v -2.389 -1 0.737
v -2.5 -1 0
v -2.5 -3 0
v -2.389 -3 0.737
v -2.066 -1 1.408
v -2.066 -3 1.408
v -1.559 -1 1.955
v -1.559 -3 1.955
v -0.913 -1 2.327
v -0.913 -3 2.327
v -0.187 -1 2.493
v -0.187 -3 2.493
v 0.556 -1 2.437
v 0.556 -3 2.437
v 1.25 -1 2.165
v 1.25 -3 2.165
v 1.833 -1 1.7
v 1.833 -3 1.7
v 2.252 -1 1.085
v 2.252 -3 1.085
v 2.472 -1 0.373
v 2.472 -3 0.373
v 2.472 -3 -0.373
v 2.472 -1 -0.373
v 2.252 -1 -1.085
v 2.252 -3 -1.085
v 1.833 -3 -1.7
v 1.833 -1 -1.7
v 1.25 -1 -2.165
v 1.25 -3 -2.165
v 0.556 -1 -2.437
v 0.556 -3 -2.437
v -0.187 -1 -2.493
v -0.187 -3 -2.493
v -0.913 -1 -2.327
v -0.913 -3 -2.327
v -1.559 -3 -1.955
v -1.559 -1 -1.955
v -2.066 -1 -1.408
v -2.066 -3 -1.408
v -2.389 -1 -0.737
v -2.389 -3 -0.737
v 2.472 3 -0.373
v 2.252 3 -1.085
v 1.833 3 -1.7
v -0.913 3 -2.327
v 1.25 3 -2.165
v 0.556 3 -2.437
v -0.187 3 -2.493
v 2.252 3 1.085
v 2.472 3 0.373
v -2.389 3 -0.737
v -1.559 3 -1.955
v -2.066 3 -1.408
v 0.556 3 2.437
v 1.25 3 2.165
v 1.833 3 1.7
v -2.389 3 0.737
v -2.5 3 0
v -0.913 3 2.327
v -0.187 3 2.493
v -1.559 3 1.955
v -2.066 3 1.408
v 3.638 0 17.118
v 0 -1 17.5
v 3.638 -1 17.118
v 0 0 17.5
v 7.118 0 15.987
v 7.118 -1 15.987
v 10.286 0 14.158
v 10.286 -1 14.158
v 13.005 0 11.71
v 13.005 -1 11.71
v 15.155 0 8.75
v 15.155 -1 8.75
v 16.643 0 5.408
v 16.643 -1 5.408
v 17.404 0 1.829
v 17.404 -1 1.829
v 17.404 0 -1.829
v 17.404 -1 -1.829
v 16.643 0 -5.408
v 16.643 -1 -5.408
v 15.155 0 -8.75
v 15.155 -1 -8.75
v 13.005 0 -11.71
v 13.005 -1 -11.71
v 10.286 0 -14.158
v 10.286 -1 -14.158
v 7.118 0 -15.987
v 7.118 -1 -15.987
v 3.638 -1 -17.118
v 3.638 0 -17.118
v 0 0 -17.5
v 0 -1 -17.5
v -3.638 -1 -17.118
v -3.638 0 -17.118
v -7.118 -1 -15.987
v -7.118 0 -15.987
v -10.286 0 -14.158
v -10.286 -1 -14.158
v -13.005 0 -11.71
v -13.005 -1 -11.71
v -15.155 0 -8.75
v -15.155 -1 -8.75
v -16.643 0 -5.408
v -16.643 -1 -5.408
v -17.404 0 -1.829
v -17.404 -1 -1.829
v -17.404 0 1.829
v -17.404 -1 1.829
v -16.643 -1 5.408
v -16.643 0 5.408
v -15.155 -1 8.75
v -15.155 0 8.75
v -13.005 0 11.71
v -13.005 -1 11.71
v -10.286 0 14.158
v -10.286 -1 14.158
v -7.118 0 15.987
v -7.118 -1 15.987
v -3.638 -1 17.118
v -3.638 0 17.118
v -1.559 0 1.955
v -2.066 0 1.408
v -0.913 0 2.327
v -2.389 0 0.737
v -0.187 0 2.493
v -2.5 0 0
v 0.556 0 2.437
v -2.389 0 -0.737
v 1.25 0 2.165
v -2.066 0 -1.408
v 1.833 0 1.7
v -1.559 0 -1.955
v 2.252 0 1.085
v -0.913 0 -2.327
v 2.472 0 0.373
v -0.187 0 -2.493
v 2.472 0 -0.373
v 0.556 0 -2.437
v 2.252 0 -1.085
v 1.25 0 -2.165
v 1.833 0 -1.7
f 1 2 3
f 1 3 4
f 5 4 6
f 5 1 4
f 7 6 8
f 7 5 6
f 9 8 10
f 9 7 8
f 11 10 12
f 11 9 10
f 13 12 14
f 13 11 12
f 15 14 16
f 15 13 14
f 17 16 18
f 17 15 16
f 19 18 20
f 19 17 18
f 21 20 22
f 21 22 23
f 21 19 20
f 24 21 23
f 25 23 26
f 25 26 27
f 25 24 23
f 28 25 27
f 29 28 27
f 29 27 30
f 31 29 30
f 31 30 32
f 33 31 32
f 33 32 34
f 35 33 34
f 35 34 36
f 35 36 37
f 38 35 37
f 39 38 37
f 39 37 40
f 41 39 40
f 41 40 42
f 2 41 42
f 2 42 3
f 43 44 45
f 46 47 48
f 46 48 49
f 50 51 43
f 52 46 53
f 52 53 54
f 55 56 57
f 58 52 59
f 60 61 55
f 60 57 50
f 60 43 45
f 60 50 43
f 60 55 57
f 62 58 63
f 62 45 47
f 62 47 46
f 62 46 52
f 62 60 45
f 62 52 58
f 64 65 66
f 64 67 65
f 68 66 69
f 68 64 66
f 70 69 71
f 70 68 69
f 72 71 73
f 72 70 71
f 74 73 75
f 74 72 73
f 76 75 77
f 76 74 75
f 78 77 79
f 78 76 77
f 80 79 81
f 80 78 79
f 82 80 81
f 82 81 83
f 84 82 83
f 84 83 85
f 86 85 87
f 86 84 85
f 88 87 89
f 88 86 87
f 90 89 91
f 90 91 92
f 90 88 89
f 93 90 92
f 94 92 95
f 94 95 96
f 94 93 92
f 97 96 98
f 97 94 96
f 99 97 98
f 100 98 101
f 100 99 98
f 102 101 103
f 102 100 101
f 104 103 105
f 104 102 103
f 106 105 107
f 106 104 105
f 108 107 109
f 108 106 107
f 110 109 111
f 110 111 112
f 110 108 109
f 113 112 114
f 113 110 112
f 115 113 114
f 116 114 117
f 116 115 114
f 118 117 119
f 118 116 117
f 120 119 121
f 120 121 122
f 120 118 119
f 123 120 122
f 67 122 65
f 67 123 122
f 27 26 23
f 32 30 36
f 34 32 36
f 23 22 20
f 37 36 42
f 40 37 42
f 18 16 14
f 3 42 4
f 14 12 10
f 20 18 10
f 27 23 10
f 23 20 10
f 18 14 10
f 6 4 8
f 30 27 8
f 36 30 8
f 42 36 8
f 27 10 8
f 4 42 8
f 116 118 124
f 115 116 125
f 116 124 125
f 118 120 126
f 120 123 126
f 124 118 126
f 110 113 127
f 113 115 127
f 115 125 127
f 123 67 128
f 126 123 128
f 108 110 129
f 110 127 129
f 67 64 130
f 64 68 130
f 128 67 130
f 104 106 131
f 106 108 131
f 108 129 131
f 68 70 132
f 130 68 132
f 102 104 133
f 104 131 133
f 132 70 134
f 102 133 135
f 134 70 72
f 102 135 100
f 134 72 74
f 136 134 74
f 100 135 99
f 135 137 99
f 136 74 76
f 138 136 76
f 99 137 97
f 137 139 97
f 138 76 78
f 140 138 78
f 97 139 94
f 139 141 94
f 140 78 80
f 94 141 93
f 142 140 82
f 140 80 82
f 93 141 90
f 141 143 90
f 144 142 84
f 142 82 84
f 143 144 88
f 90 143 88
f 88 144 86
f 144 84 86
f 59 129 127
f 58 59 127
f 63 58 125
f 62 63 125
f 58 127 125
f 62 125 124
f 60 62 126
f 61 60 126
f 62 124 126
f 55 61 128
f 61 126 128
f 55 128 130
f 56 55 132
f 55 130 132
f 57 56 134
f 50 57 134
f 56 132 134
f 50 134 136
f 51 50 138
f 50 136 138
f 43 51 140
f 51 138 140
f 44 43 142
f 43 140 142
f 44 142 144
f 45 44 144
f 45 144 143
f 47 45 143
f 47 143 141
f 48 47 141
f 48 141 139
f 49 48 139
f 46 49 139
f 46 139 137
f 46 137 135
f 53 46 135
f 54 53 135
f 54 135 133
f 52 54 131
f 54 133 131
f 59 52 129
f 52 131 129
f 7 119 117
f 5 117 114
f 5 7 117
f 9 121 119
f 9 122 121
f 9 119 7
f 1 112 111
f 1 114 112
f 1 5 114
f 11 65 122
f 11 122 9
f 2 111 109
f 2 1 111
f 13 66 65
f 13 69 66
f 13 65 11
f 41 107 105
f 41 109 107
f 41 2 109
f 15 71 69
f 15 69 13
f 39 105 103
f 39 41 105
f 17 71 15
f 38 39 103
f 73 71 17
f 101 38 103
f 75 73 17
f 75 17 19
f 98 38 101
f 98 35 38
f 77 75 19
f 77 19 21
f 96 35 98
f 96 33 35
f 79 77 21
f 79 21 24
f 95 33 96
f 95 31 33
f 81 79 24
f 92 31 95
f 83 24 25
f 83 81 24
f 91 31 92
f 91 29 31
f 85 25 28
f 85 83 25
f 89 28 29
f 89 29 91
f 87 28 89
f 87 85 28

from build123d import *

# Parameters (mm, degrees)
F0_W     = 1
F0_H     = 17.5
F2_R     = 2.5
F3_DEPTH = 3
F4_DEPTH = 6


with BuildPart() as f1:
    # F0 (on Right) → F1 (revolve)
    with BuildSketch(Plane.YZ):
        with Locations((-0.5, 8.75)):
            Rectangle(F0_W, F0_H)
    revolve(axis=Axis((0, -0.5, 0), (0, 1, 0)))

    # F2 (on face) → F3 (join)
    with BuildSketch(Plane(origin=(0, 0, 0), x_dir=(-1, 0, 0), z_dir=(0, 1, 0))):
        Circle(F2_R)
    extrude(amount=F3_DEPTH)

    # F4 (add): a face of the model
    f4_faces = [f1.faces().sort_by_distance(p)[0] for p in [
        (0, 3, 0),
    ]]
    extrude(f4_faces, amount=-F4_DEPTH)


solid = f1.part
